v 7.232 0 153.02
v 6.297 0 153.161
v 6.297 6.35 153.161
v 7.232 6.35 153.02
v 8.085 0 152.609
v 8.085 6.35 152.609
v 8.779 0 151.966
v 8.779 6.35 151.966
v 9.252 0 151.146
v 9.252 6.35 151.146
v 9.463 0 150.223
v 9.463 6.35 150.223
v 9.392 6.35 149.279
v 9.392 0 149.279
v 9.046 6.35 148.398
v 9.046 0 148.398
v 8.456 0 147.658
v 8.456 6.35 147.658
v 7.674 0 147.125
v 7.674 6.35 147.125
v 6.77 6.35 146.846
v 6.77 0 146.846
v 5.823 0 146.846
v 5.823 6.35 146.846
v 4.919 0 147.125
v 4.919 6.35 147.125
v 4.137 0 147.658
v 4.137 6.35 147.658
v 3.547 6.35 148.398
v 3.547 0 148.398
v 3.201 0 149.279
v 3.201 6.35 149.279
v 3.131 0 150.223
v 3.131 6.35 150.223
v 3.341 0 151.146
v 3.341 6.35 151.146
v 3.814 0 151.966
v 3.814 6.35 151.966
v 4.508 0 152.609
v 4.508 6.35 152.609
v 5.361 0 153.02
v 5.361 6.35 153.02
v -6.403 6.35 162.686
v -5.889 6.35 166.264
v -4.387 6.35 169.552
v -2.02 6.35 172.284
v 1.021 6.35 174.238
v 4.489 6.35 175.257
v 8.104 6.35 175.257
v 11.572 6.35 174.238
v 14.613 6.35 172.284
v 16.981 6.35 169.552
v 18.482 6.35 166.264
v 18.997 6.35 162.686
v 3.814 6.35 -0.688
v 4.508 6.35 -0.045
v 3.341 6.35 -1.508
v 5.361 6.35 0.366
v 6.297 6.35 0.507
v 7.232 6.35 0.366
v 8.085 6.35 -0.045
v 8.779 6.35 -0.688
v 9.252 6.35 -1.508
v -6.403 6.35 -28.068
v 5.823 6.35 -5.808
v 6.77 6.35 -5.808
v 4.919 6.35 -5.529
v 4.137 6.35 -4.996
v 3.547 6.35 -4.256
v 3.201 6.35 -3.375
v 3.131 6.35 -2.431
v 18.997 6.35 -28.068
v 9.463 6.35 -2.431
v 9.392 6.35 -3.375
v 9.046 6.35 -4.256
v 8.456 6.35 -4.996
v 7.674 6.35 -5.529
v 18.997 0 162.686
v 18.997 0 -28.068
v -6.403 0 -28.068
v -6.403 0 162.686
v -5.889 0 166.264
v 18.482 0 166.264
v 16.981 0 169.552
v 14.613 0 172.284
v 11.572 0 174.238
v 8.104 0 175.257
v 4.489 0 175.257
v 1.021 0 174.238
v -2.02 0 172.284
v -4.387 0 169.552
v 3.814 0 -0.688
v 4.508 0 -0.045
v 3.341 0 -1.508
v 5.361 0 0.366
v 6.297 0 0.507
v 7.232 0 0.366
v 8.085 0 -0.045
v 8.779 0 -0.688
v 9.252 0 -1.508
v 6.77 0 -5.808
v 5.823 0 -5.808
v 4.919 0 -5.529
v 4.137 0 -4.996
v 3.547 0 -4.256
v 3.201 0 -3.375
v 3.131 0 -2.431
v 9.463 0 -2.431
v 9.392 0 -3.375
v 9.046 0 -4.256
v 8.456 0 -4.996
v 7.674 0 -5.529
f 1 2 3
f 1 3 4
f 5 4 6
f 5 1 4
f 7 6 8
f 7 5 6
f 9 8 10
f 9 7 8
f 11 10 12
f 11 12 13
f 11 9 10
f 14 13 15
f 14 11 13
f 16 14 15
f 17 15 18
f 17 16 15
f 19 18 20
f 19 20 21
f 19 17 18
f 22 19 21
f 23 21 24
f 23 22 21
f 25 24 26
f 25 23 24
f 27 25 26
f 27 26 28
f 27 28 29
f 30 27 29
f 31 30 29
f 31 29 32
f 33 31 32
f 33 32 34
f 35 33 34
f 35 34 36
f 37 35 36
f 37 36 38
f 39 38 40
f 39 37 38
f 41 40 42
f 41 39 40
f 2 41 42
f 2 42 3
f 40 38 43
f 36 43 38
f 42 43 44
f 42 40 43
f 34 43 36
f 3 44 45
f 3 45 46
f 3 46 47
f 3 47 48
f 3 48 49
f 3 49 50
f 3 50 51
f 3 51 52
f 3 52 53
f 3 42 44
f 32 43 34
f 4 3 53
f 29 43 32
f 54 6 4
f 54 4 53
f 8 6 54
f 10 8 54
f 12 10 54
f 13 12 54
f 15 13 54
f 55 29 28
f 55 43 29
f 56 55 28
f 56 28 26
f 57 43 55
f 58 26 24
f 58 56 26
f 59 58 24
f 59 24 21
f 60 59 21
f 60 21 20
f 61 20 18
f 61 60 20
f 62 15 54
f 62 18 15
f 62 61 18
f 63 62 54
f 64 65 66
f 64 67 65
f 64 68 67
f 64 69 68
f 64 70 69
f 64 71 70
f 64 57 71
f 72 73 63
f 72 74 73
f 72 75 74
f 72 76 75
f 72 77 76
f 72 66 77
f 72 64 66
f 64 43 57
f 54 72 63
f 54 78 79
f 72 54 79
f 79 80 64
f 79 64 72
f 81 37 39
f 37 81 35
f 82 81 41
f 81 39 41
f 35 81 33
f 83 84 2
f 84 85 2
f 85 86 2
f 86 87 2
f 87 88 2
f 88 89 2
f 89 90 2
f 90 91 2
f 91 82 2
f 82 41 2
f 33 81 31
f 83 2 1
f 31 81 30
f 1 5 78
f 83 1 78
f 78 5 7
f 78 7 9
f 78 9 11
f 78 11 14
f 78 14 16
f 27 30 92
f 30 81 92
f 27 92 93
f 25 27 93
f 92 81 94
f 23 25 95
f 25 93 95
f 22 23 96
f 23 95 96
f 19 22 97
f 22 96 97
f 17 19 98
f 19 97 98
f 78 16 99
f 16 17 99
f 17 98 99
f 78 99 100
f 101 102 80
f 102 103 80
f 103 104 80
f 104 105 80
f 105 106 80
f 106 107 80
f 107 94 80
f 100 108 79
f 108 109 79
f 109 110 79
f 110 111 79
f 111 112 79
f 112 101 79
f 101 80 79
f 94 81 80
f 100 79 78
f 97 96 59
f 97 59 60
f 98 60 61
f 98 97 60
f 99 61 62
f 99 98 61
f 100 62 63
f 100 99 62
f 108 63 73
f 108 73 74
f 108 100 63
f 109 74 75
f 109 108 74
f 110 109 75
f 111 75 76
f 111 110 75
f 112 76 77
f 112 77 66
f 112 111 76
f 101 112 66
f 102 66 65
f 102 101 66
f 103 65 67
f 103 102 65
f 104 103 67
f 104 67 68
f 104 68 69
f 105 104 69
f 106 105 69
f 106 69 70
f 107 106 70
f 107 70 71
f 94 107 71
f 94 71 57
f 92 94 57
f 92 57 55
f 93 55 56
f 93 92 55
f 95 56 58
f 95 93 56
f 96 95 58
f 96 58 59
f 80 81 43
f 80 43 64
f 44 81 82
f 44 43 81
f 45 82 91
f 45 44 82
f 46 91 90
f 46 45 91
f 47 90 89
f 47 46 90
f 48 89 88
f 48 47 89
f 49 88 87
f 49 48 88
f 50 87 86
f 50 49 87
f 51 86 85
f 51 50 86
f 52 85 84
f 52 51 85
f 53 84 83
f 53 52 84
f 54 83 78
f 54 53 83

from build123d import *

# Parameters (mm, degrees)
SKETCH1_W           = 25.4
SKETCH1_H           = 203.454
SKETCH1_R           = 3.175
BOSS_EXTRUDE1_DEPTH = 6.35
FILLET1_RADIUS      = 12.7
FILLET1_LENGTH      = 6.35


with BuildPart() as part:
    # Sketch1 → Boss-Extrude1 (new body)
    with BuildSketch(Plane(origin=(0, 0, 0), x_dir=(1, 0, 0), z_dir=(0, 1, 0))):
        with Locations((6.296638655, -73.658932773)):
            Rectangle(SKETCH1_W, SKETCH1_H)
        with Locations(Location((6.296638655, 2.668067227, 0), (0, 0, 270))):
            Circle(SKETCH1_R, mode=Mode.SUBTRACT)
        with Locations(Location((6.296638655, -149.985932773, 0), (0, 0, 270))):
            Circle(SKETCH1_R, mode=Mode.SUBTRACT)
    extrude(amount=BOSS_EXTRUDE1_DEPTH)

    # Fillet1: full round fillet: the end face becomes a half cylinder, R = half its width
    fillet1_face = Plane((6.296638655, 3.175, 175.385932773), x_dir=(0, 1, 0), z_dir=(0, 0, 1))  # on the end face: x along it, z out of the body
    fillet1_slab = fillet1_face.offset(-FILLET1_RADIUS / 2) * Box(FILLET1_LENGTH, 2 * FILLET1_RADIUS, FILLET1_RADIUS, mode=Mode.PRIVATE)  # the body's end, R deep
    fillet1_round = Plane((6.296638655, 3.175, 162.685932773), x_dir=(0, 0, 1), z_dir=(0, 1, 0)) * Cylinder(FILLET1_RADIUS, FILLET1_LENGTH, mode=Mode.PRIVATE)  # its axis R under the face
    add(fillet1_slab - fillet1_round, mode=Mode.SUBTRACT)


solid = part.part
